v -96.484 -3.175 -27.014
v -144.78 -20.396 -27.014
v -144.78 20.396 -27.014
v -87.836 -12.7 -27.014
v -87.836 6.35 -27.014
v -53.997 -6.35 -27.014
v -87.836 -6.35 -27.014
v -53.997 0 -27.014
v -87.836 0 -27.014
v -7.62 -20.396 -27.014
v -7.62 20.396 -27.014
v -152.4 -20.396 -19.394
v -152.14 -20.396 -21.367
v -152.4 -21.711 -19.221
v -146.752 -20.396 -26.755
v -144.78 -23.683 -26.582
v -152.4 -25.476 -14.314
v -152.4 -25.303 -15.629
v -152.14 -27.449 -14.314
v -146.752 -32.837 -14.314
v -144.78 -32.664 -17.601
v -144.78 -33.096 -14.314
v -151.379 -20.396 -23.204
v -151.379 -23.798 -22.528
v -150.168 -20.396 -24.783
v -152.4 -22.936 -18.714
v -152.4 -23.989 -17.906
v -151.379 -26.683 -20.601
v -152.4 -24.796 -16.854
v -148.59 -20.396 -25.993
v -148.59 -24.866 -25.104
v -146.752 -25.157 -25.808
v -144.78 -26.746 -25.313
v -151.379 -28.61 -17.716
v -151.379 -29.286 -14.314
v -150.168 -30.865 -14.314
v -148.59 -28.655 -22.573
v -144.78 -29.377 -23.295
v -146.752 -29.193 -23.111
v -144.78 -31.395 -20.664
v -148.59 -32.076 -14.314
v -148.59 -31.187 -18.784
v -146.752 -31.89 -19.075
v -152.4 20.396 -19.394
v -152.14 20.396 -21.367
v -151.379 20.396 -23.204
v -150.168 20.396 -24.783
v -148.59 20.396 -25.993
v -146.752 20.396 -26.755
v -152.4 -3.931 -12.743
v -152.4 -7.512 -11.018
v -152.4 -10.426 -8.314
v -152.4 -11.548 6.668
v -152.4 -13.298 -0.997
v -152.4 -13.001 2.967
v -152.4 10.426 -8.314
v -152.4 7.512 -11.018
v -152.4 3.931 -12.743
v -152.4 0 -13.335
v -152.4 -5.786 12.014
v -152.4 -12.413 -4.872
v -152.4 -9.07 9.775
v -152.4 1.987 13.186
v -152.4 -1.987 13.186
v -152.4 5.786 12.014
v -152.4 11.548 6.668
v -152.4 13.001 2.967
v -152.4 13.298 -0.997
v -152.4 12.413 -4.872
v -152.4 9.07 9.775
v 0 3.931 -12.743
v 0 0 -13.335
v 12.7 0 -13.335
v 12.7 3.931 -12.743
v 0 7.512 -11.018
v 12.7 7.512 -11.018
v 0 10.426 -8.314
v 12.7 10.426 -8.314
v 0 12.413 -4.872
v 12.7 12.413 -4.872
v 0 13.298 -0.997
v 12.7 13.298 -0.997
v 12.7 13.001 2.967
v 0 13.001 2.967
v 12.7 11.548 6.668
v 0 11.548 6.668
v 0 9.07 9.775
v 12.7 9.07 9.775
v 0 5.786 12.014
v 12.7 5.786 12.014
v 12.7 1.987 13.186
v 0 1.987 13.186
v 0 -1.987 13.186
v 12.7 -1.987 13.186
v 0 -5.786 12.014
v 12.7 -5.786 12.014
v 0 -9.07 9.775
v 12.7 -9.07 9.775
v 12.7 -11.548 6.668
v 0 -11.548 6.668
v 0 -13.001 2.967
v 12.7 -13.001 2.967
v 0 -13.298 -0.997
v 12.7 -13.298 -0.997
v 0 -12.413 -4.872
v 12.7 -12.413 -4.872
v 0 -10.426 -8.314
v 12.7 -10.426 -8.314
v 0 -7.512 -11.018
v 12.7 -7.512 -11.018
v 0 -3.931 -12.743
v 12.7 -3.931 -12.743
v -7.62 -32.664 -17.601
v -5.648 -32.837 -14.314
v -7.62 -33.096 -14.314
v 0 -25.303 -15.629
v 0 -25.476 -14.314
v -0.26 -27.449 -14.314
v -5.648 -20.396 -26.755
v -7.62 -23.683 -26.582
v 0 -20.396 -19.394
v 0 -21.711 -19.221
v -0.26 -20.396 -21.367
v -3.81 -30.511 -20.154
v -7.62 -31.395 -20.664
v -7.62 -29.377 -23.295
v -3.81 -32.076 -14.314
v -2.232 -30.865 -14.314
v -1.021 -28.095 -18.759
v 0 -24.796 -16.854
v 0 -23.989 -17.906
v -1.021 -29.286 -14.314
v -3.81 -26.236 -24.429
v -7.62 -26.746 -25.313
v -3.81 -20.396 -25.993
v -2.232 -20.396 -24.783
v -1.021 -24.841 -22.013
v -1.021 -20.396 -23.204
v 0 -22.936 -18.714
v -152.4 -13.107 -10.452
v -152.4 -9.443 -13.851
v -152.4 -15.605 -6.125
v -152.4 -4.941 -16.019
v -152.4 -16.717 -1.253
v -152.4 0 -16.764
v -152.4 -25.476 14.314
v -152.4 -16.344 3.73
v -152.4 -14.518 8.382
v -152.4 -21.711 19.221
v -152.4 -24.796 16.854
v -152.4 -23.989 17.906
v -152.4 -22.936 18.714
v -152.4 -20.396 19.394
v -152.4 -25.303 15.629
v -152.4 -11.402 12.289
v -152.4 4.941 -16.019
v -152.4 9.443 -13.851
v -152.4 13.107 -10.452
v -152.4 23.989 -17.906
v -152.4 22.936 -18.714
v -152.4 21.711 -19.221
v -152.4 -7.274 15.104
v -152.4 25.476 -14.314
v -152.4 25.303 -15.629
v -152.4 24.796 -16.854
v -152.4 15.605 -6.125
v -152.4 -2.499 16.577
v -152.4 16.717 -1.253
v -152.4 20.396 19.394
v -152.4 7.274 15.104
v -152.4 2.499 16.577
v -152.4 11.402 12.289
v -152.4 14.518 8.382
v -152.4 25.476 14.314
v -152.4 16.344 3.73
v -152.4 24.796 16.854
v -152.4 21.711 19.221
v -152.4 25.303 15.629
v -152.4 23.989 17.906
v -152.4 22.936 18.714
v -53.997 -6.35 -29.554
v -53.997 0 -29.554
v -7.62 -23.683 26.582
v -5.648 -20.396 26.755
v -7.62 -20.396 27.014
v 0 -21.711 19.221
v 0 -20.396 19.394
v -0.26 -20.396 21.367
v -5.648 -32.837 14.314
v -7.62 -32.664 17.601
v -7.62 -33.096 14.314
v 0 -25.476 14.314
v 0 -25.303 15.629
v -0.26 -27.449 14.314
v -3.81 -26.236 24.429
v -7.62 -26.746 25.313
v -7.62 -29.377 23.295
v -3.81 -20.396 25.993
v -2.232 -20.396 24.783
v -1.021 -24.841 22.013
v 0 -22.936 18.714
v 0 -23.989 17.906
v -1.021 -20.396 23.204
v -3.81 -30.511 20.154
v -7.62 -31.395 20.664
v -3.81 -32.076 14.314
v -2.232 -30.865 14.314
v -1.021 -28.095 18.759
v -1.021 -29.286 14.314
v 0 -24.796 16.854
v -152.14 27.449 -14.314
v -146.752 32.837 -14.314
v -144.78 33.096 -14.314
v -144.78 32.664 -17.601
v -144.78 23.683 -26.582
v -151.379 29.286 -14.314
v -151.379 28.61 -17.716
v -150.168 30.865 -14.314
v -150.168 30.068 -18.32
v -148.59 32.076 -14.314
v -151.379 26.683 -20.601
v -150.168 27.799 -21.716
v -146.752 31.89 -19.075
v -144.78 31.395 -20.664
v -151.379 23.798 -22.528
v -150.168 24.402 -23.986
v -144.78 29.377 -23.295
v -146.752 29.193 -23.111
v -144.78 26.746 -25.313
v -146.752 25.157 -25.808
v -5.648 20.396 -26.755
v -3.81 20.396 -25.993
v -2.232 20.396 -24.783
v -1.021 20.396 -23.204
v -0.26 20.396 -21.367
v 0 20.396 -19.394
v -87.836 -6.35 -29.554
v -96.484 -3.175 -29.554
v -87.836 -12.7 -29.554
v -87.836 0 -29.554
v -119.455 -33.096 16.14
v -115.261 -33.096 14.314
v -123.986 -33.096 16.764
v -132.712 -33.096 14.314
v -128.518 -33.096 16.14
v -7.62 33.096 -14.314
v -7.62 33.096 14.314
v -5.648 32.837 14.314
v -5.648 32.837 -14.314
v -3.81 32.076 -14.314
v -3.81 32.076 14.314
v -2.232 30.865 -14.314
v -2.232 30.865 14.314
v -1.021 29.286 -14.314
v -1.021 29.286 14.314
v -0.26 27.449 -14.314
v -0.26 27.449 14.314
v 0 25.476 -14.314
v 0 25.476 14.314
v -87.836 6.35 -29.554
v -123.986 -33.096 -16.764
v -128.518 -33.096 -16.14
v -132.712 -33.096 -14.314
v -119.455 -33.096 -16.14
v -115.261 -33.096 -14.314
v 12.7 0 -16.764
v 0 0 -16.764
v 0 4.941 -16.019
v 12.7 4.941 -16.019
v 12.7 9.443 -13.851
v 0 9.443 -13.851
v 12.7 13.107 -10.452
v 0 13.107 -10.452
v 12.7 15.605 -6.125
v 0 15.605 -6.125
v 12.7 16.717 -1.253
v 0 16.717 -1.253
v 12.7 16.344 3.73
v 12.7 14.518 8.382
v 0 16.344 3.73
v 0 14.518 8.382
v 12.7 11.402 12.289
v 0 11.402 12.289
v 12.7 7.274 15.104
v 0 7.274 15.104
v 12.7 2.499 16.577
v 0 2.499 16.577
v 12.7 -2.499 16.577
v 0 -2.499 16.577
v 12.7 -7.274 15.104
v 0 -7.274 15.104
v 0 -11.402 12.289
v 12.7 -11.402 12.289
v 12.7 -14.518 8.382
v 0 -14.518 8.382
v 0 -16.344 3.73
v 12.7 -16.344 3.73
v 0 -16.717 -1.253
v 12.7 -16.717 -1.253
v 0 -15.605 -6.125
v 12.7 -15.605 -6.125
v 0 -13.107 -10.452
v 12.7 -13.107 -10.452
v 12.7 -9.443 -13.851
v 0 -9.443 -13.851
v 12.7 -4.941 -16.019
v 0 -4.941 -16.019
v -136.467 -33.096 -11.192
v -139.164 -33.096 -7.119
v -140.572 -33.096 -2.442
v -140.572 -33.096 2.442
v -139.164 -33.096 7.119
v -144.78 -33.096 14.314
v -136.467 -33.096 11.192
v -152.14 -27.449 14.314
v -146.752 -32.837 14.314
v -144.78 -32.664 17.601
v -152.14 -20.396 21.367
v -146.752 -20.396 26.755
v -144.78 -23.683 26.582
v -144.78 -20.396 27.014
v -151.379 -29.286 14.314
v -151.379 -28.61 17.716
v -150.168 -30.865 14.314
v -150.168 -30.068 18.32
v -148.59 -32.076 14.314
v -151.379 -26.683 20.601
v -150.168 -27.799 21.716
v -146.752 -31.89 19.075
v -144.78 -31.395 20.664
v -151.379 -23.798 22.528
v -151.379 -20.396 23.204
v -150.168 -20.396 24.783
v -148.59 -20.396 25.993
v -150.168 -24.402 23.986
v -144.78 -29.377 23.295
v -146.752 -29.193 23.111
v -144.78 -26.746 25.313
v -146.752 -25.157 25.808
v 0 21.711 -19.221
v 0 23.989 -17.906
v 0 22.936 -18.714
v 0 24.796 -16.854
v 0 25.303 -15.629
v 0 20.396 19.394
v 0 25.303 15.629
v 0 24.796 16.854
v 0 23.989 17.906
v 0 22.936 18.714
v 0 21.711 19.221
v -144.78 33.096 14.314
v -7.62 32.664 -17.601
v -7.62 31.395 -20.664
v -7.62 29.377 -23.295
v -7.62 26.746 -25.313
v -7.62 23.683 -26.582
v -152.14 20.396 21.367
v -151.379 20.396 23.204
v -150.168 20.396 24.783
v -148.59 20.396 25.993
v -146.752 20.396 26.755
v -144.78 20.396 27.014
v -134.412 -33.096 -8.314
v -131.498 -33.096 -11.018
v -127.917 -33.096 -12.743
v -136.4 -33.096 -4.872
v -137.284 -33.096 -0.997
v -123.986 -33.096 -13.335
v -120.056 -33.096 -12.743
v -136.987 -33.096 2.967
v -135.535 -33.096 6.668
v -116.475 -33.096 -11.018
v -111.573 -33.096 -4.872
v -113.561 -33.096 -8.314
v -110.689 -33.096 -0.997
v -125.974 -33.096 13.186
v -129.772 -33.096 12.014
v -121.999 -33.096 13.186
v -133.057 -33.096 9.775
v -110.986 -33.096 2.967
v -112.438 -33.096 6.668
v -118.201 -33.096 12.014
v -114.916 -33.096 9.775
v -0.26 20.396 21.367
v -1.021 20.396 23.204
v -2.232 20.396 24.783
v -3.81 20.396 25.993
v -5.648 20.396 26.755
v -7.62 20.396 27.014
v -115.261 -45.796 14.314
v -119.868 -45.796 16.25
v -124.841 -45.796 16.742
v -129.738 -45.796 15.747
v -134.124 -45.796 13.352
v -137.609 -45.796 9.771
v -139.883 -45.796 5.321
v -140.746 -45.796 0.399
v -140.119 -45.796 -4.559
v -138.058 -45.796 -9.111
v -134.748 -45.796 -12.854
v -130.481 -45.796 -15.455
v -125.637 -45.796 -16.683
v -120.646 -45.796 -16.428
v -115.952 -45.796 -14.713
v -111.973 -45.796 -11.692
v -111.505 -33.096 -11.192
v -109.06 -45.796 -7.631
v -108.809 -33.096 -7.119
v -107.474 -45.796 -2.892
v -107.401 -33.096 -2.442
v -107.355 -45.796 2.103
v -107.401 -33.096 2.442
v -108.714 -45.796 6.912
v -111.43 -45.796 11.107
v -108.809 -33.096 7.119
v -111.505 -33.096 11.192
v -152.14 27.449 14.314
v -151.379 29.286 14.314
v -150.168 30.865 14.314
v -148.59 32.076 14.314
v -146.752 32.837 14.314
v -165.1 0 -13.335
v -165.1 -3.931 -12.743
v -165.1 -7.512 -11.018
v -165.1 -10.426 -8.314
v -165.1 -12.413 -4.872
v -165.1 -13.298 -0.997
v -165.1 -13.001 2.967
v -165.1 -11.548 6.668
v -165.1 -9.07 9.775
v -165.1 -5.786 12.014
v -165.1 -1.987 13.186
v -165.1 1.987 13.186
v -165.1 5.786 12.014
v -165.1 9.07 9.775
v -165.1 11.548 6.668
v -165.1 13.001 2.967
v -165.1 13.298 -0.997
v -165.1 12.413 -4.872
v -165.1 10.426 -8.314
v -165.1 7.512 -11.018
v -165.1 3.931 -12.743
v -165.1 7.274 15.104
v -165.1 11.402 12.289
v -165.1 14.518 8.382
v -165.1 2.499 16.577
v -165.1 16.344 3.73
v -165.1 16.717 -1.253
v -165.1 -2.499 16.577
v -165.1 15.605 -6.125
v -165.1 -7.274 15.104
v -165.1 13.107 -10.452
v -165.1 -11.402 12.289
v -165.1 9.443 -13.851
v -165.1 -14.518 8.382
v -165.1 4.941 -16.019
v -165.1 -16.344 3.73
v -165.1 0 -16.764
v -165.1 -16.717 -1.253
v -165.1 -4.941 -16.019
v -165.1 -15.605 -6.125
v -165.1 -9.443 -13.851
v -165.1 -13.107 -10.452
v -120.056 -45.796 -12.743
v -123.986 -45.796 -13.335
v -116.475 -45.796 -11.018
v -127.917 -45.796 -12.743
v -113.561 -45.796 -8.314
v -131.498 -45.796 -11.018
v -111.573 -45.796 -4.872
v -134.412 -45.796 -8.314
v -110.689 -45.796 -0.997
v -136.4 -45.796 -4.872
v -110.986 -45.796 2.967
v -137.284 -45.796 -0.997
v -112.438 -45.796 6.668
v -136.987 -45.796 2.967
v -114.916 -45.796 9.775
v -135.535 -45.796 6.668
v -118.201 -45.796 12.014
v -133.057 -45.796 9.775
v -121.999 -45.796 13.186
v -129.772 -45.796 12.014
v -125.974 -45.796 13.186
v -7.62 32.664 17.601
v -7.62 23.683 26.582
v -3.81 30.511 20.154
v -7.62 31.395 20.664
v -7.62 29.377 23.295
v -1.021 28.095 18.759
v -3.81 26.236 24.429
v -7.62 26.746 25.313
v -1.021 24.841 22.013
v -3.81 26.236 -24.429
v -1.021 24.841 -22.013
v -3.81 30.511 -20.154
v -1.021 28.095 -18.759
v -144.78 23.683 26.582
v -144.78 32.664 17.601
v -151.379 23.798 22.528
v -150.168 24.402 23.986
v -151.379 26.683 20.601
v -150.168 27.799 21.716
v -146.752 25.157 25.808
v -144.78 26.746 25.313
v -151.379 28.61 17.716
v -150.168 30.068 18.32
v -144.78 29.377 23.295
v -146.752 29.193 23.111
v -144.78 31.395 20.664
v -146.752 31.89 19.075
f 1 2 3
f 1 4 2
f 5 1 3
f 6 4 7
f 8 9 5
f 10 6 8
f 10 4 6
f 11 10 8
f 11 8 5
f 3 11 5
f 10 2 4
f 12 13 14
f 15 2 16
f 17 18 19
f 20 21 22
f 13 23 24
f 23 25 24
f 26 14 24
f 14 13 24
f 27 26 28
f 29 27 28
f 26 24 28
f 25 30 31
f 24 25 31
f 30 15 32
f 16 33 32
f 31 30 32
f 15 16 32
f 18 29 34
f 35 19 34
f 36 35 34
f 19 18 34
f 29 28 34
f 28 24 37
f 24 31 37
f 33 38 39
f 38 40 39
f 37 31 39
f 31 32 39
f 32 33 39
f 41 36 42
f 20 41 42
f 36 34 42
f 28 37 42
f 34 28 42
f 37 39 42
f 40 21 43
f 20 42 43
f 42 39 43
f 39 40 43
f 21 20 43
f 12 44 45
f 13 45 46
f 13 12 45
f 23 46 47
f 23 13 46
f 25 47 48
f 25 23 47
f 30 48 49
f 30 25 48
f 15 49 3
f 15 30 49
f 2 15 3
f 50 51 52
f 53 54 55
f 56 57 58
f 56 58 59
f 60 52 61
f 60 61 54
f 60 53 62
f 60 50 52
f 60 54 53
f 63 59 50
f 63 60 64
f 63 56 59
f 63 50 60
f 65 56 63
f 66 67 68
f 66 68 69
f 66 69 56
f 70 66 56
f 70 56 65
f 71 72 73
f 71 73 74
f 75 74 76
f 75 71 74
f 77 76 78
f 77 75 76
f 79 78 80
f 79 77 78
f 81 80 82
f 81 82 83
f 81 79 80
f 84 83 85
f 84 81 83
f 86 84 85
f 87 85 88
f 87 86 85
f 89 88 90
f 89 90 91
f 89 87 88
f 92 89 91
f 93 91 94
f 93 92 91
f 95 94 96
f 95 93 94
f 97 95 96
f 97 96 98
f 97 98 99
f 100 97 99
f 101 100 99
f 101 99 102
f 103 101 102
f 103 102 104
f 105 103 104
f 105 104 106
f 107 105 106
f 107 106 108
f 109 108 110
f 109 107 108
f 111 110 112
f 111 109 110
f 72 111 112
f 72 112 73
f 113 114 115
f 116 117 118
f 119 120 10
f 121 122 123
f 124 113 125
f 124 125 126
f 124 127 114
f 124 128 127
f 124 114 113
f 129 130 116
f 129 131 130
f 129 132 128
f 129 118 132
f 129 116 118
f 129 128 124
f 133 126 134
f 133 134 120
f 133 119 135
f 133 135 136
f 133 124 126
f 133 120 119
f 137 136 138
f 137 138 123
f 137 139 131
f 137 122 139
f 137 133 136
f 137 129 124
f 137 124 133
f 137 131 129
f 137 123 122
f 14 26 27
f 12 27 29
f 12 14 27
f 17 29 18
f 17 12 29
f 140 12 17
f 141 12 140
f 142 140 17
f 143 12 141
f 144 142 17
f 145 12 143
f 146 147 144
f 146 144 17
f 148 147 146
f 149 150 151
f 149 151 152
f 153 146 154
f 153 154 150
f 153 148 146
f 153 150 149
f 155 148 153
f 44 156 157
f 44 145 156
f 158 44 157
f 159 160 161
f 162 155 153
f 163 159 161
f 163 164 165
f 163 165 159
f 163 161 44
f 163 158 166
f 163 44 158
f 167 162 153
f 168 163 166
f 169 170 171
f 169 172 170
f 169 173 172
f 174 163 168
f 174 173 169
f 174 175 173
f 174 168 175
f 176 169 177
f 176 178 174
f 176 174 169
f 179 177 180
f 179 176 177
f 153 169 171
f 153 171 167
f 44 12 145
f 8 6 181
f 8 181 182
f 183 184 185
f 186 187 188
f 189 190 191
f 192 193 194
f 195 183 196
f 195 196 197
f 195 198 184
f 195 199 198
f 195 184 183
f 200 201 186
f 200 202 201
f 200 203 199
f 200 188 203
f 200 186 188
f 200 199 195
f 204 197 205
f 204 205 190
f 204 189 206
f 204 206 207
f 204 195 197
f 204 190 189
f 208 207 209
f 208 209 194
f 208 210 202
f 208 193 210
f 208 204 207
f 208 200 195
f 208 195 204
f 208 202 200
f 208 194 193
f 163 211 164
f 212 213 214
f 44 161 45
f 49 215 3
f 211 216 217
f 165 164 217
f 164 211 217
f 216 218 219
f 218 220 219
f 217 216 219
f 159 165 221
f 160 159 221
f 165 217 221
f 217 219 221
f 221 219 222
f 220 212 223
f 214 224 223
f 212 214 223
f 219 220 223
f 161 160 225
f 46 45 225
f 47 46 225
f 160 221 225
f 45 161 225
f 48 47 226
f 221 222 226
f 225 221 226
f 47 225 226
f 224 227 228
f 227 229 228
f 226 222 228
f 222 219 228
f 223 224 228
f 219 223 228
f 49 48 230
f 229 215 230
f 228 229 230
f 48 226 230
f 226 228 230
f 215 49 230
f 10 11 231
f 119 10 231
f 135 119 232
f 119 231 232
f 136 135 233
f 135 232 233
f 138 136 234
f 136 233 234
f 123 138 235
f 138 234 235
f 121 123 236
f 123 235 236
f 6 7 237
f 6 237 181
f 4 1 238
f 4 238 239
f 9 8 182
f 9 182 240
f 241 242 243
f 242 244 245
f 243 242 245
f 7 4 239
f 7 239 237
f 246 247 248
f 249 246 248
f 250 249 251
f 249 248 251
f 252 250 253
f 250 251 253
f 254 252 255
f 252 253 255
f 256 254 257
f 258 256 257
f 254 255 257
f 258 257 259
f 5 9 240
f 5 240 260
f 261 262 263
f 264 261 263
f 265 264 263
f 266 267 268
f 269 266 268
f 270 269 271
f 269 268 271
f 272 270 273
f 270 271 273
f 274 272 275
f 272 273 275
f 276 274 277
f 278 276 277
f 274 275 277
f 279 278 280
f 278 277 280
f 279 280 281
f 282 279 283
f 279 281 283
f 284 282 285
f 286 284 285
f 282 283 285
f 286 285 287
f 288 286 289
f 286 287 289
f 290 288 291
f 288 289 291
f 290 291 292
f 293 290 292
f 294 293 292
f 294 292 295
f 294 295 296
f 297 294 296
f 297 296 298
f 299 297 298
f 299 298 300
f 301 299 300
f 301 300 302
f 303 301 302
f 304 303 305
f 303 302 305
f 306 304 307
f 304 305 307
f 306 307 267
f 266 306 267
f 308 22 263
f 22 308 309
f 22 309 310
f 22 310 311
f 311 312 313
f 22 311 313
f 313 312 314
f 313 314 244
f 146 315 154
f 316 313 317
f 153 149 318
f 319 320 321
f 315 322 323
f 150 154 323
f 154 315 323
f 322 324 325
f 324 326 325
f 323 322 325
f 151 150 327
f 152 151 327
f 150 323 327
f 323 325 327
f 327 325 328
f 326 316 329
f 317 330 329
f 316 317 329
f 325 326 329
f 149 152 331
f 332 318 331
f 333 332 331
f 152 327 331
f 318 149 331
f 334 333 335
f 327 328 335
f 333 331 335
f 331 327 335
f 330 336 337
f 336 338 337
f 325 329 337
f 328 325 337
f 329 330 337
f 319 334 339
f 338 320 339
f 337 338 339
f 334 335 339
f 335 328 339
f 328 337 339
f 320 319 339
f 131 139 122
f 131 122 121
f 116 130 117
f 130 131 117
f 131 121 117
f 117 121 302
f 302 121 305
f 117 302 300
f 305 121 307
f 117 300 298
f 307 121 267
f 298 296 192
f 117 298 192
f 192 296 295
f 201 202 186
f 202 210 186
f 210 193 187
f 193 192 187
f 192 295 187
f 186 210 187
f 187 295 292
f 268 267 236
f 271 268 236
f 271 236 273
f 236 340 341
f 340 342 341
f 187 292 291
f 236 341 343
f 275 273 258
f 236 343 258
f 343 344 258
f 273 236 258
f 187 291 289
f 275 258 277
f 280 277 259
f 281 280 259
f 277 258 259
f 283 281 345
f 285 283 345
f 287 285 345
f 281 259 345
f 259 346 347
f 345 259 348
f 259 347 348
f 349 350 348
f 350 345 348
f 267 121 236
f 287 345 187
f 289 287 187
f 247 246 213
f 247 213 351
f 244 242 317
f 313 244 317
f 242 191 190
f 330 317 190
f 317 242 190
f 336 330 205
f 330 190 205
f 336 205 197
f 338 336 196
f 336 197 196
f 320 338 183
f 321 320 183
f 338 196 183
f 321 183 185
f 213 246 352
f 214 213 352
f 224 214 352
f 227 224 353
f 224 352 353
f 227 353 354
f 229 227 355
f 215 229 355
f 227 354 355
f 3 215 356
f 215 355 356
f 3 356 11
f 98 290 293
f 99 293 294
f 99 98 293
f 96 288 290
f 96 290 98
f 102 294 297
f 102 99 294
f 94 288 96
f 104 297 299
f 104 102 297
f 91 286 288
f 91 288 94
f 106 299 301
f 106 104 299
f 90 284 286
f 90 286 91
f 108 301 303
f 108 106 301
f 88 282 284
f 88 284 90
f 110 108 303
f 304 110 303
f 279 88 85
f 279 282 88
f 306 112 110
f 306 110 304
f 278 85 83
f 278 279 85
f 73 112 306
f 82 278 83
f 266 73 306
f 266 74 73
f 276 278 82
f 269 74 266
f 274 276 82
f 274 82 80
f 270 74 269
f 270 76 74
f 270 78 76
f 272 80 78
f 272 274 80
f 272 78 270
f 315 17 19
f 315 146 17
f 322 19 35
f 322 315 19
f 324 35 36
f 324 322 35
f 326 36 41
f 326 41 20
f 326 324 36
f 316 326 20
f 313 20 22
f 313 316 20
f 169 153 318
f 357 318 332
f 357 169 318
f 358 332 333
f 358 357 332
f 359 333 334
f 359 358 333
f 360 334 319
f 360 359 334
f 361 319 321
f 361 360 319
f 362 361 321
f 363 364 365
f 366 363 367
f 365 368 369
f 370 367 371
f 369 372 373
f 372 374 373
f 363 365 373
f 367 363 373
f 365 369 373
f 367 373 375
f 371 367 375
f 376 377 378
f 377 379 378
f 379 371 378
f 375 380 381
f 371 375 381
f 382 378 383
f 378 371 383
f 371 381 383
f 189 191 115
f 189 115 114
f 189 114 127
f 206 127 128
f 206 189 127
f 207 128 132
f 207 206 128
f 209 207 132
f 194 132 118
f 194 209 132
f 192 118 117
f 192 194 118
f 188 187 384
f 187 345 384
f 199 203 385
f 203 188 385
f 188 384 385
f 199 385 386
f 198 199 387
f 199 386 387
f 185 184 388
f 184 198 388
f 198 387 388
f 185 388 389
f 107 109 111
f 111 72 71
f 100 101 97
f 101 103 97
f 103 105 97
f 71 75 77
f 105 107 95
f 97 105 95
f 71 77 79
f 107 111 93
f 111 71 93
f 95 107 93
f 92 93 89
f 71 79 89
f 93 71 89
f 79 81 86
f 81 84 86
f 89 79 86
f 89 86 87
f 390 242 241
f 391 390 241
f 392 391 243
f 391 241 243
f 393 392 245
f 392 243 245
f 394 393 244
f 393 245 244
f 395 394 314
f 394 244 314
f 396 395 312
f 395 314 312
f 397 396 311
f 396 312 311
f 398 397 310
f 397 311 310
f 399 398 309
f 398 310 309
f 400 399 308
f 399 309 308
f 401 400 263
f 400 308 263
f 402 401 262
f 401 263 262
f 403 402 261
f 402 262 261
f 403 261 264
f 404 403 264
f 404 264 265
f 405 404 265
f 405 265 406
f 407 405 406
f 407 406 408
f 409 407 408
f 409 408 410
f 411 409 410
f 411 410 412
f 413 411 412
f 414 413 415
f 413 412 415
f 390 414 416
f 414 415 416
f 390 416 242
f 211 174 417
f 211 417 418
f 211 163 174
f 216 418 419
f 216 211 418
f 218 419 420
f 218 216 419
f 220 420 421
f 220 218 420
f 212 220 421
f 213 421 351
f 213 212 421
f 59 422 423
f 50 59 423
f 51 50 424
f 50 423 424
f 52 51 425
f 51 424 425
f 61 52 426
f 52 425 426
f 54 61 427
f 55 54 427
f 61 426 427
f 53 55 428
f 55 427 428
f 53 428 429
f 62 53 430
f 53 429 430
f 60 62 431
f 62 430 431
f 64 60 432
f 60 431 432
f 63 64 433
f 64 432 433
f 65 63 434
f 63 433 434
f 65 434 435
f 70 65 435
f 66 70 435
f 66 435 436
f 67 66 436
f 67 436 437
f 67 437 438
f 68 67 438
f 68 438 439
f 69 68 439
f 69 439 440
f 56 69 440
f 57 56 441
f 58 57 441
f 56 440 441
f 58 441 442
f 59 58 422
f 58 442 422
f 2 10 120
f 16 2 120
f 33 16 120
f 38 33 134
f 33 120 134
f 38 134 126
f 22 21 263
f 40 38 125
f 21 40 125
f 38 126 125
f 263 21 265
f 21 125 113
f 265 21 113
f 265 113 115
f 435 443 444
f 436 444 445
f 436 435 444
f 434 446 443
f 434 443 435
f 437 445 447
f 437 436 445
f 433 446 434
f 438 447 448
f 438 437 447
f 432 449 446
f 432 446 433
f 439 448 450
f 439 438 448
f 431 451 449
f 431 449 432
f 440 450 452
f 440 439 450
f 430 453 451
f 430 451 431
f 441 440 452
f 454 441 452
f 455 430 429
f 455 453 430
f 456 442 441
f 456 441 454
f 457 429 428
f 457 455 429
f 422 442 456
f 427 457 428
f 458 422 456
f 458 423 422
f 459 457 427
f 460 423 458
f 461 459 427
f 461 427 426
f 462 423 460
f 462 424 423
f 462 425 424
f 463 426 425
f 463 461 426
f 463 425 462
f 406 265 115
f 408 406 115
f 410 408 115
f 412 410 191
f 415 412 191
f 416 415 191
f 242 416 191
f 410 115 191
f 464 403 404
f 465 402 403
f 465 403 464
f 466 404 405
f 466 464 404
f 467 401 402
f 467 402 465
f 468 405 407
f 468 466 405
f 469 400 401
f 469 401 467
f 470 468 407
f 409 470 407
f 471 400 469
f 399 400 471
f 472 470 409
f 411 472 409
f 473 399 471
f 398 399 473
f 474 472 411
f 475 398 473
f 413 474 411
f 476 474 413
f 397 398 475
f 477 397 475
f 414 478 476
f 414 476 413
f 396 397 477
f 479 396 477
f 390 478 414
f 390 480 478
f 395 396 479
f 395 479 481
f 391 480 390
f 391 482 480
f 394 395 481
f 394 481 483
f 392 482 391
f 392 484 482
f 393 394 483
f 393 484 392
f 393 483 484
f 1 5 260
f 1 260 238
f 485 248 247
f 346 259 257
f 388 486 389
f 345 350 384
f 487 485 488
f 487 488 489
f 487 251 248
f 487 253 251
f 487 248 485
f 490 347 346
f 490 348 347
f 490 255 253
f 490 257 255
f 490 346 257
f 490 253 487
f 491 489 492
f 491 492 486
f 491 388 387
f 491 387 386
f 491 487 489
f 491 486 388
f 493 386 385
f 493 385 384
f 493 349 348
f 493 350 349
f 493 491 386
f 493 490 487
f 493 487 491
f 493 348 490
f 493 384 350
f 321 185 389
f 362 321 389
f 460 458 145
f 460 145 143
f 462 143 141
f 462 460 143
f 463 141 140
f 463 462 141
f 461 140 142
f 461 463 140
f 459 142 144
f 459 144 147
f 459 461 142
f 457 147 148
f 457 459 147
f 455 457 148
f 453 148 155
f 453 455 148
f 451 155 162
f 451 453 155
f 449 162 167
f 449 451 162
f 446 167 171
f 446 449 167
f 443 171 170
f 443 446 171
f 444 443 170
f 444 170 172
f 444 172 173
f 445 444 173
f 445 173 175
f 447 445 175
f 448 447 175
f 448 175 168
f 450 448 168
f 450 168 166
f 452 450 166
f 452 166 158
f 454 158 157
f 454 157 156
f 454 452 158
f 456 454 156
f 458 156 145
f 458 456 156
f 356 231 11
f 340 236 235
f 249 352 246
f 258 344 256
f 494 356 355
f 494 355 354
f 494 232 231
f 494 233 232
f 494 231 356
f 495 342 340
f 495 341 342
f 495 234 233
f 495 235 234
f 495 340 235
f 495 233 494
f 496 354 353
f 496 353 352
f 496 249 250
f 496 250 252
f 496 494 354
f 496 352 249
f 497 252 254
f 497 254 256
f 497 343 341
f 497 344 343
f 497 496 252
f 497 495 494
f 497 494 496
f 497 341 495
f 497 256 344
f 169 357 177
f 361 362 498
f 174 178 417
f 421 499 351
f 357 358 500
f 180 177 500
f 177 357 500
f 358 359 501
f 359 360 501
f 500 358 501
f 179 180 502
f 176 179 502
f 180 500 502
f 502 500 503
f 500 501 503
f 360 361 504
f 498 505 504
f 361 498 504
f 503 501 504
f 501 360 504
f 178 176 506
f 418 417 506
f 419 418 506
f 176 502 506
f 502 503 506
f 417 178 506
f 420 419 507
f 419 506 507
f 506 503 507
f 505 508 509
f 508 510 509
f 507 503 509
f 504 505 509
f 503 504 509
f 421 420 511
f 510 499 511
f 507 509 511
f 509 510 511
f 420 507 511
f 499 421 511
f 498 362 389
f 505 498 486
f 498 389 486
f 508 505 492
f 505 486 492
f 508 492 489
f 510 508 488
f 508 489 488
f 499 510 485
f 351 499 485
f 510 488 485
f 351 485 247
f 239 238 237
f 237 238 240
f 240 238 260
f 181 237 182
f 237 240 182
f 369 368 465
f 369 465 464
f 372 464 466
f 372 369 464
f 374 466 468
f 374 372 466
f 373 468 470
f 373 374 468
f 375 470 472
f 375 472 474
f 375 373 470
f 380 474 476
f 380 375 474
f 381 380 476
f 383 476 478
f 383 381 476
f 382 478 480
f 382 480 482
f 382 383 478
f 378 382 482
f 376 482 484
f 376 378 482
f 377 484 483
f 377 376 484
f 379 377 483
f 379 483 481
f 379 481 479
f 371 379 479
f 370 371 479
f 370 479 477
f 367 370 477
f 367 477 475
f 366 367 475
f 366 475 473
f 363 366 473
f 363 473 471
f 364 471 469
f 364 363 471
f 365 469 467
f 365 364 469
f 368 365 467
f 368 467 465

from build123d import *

# Parameters (mm, degrees)
SKETCH1_R           = 16.764
SKETCH1_R_2         = 13.335
BOSS_EXTRUDE1_DEPTH = 12.7
SKETCH2_W           = 54.028772228
SKETCH2_H           = 66.192828526
BOSS_EXTRUDE2_DEPTH = 152.4
FILLET1_R           = 7.62
FILLET2_R           = 12.7
FILLET3_R           = 12.7
FILLET4_R           = 7.62
BOSS_EXTRUDE3_START = 12.7
SKETCH3_R           = 16.764
SKETCH3_R_2         = 13.335
BOSS_EXTRUDE3_DEPTH = 12.7
SKETCH4_R           = 16.764
SKETCH4_R_2         = 13.335
BOSS_EXTRUDE4_DEPTH = 12.7
BOSS_EXTRUDE5_DEPTH = 2.54


with BuildPart() as part:
    # Sketch1 → Boss-Extrude1 (new body)
    with BuildSketch(Plane(origin=(0, 0, 0), x_dir=(0, 0, -1), z_dir=(1, 0, 0))):
        Circle(SKETCH1_R)
        Circle(SKETCH1_R_2, mode=Mode.SUBTRACT)
    extrude(amount=BOSS_EXTRUDE1_DEPTH)

    # Sketch2 → Boss-Extrude2 (add)
    with BuildSketch(Plane.ZY):
        Rectangle(SKETCH2_W, SKETCH2_H)
    extrude(amount=BOSS_EXTRUDE2_DEPTH)

    # Fillet1
    fillet1_edges = [part.edges().sort_by_distance(p)[0] for p in [
        (0, 33.096414263, 0),
        (0, 0, -27.014386114),
        (0, -33.096414263, 0),
        (0, 0, 27.014386114),
    ]]
    fillet(fillet1_edges, radius=FILLET1_R)

    # Fillet2
    # the kernel refuses this fillet: 12.7 mm, written as the material it takes off along each edge
    with BuildSketch(Plane(origin=(0, -20.396414263, -14.314386114), x_dir=(0, -1, 0), z_dir=(0, 0, 1))) as fillet2_piece_1:
        with BuildLine():
            CenterArc((5.08, -7.62), 7.62, 0, 90)
            Line((12.7, -7.62), (12.7, 0))
            Line((12.7, 0), (5.08, 0))
        make_face()
    revolve(axis=Axis((0, -20.396414263, -14.314386114), (1, 0, 0)), revolution_arc=90, mode=Mode.SUBTRACT)
    with BuildSketch(Plane(origin=(0, 20.396414263, -14.314386114), x_dir=(0, 0, -1), z_dir=(0, -1, 0))) as fillet2_piece_2:
        with BuildLine():
            CenterArc((5.08, -7.62), 7.62, 0, 90)
            Line((12.7, -7.62), (12.7, 0))
            Line((12.7, 0), (5.08, 0))
        make_face()
    revolve(axis=Axis((0, 20.396414263, -14.314386114), (1, 0, 0)), revolution_arc=90, mode=Mode.SUBTRACT)
    with BuildSketch(Plane(origin=(0, 20.396414263, 14.314386114), x_dir=(0, 1, 0), z_dir=(0, 0, -1))) as fillet2_piece_3:
        with BuildLine():
            CenterArc((5.08, -7.62), 7.62, 0, 90)
            Line((12.7, -7.62), (12.7, 0))
            Line((12.7, 0), (5.08, 0))
        make_face()
    revolve(axis=Axis((0, 20.396414263, 14.314386114), (1, 0, 0)), revolution_arc=90, mode=Mode.SUBTRACT)
    with BuildSketch(Plane(origin=(0, 33.096414263, 27.014386114), x_dir=(0, -1, 0), z_dir=(-1, 0, 0))) as fillet2_piece_4:
        with BuildLine():
            CenterArc((FILLET2_R, -FILLET2_R), FILLET2_R, 90, 90)
            Line((0, -FILLET2_R), (0, 0))
            Line((0, 0), (FILLET2_R, 0))
        make_face()
    extrude(amount=184.15, mode=Mode.SUBTRACT)
    with BuildSketch(Plane(origin=(0, 33.096414263, -27.014386114), x_dir=(0, -1, 0), z_dir=(-1, 0, 0)), Plane(origin=(0, -33.096414263, -27.014386114), x_dir=(0, 0, 1), z_dir=(-1, 0, 0))) as fillet2_piece_5:
        with BuildLine():
            CenterArc((FILLET2_R, FILLET2_R), FILLET2_R, 180, 90)
            Line((0, FILLET2_R), (0, 0))
            Line((0, 0), (FILLET2_R, 0))
        make_face()
    extrude(amount=184.15, mode=Mode.SUBTRACT)

    # Fillet3
    # the kernel refuses this fillet: 12.7 mm, written as the material it takes off along each edge
    with BuildSketch(Plane(origin=(0, -20.396414263, 14.314386114), x_dir=(0, 0, 1), z_dir=(0, 1, 0))) as fillet3_piece_1:
        with BuildLine():
            CenterArc((5.08, -7.62), 7.62, 0, 90)
            Line((12.7, -7.62), (12.7, 0))
            Line((12.7, 0), (5.08, 0))
        make_face()
    revolve(axis=Axis((0, -20.396414263, 14.314386114), (1, 0, 0)), revolution_arc=90, mode=Mode.SUBTRACT)
    with BuildSketch(Plane(origin=(0, -33.096414263, 27.014386114), x_dir=(0, 0, -1), z_dir=(-1, 0, 0))) as fillet3_piece_2:
        with BuildLine():
            CenterArc((FILLET3_R, -FILLET3_R), FILLET3_R, 90, 90)
            Line((0, -FILLET3_R), (0, 0))
            Line((0, 0), (FILLET3_R, 0))
        make_face()
    extrude(amount=184.15, mode=Mode.SUBTRACT)

    # Fillet4
    fillet4_edges = [part.edges().sort_by_distance(p)[0] for p in [
        (-152.4, -33.096414263, 0),
        (-152.4, 0, -27.014386114),
        (-152.4, 33.096414263, 0),
        (-152.4, 29.376670384, -23.294642235),
        (-152.4, 29.376670384, 23.294642235),
        (-152.4, -29.376670384, -23.294642235),
        (-152.4, 0, 27.014386114),
        (-152.4, -29.376670384, 23.294642235),
    ]]
    fillet(fillet4_edges, radius=FILLET4_R)

    # Sketch3 → Boss-Extrude3 (add)
    with BuildSketch(Plane.ZY.offset(152.4).offset(BOSS_EXTRUDE3_START)):
        with Locations(Location((0, 0, 0), (0, 0, 180))):
            Circle(SKETCH3_R)
        with Locations(Location((0, 0, 0), (0, 0, 180))):
            Circle(SKETCH3_R_2, mode=Mode.SUBTRACT)
    extrude(amount=-BOSS_EXTRUDE3_DEPTH)

    # Sketch4 → Boss-Extrude4 (add)
    with BuildSketch(Plane.XZ.offset(33.096414263)):
        with Locations(Location((-123.986445469, 0, 0), (0, 0, 58.635839184))):
            Circle(SKETCH4_R)
        with Locations(Location((-123.986445469, 0, 0), (0, 0, 270))):
            Circle(SKETCH4_R_2, mode=Mode.SUBTRACT)
    extrude(amount=BOSS_EXTRUDE4_DEPTH)

    # Sketch5 → Boss-Extrude5 (add)
    with BuildSketch(Plane(origin=(0, 0, -27.014386114), x_dir=(-1, 0, 0), z_dir=(0, 0, -1))):
        Polygon((53.996659103, 0), (87.835708054, 0), (87.835708054, 6.35), (96.484197887, -3.175), (87.835708054, -12.7), (87.835708054, -6.35), (53.996659103, -6.35), align=None)
    extrude(amount=BOSS_EXTRUDE5_DEPTH)


solid = part.part
